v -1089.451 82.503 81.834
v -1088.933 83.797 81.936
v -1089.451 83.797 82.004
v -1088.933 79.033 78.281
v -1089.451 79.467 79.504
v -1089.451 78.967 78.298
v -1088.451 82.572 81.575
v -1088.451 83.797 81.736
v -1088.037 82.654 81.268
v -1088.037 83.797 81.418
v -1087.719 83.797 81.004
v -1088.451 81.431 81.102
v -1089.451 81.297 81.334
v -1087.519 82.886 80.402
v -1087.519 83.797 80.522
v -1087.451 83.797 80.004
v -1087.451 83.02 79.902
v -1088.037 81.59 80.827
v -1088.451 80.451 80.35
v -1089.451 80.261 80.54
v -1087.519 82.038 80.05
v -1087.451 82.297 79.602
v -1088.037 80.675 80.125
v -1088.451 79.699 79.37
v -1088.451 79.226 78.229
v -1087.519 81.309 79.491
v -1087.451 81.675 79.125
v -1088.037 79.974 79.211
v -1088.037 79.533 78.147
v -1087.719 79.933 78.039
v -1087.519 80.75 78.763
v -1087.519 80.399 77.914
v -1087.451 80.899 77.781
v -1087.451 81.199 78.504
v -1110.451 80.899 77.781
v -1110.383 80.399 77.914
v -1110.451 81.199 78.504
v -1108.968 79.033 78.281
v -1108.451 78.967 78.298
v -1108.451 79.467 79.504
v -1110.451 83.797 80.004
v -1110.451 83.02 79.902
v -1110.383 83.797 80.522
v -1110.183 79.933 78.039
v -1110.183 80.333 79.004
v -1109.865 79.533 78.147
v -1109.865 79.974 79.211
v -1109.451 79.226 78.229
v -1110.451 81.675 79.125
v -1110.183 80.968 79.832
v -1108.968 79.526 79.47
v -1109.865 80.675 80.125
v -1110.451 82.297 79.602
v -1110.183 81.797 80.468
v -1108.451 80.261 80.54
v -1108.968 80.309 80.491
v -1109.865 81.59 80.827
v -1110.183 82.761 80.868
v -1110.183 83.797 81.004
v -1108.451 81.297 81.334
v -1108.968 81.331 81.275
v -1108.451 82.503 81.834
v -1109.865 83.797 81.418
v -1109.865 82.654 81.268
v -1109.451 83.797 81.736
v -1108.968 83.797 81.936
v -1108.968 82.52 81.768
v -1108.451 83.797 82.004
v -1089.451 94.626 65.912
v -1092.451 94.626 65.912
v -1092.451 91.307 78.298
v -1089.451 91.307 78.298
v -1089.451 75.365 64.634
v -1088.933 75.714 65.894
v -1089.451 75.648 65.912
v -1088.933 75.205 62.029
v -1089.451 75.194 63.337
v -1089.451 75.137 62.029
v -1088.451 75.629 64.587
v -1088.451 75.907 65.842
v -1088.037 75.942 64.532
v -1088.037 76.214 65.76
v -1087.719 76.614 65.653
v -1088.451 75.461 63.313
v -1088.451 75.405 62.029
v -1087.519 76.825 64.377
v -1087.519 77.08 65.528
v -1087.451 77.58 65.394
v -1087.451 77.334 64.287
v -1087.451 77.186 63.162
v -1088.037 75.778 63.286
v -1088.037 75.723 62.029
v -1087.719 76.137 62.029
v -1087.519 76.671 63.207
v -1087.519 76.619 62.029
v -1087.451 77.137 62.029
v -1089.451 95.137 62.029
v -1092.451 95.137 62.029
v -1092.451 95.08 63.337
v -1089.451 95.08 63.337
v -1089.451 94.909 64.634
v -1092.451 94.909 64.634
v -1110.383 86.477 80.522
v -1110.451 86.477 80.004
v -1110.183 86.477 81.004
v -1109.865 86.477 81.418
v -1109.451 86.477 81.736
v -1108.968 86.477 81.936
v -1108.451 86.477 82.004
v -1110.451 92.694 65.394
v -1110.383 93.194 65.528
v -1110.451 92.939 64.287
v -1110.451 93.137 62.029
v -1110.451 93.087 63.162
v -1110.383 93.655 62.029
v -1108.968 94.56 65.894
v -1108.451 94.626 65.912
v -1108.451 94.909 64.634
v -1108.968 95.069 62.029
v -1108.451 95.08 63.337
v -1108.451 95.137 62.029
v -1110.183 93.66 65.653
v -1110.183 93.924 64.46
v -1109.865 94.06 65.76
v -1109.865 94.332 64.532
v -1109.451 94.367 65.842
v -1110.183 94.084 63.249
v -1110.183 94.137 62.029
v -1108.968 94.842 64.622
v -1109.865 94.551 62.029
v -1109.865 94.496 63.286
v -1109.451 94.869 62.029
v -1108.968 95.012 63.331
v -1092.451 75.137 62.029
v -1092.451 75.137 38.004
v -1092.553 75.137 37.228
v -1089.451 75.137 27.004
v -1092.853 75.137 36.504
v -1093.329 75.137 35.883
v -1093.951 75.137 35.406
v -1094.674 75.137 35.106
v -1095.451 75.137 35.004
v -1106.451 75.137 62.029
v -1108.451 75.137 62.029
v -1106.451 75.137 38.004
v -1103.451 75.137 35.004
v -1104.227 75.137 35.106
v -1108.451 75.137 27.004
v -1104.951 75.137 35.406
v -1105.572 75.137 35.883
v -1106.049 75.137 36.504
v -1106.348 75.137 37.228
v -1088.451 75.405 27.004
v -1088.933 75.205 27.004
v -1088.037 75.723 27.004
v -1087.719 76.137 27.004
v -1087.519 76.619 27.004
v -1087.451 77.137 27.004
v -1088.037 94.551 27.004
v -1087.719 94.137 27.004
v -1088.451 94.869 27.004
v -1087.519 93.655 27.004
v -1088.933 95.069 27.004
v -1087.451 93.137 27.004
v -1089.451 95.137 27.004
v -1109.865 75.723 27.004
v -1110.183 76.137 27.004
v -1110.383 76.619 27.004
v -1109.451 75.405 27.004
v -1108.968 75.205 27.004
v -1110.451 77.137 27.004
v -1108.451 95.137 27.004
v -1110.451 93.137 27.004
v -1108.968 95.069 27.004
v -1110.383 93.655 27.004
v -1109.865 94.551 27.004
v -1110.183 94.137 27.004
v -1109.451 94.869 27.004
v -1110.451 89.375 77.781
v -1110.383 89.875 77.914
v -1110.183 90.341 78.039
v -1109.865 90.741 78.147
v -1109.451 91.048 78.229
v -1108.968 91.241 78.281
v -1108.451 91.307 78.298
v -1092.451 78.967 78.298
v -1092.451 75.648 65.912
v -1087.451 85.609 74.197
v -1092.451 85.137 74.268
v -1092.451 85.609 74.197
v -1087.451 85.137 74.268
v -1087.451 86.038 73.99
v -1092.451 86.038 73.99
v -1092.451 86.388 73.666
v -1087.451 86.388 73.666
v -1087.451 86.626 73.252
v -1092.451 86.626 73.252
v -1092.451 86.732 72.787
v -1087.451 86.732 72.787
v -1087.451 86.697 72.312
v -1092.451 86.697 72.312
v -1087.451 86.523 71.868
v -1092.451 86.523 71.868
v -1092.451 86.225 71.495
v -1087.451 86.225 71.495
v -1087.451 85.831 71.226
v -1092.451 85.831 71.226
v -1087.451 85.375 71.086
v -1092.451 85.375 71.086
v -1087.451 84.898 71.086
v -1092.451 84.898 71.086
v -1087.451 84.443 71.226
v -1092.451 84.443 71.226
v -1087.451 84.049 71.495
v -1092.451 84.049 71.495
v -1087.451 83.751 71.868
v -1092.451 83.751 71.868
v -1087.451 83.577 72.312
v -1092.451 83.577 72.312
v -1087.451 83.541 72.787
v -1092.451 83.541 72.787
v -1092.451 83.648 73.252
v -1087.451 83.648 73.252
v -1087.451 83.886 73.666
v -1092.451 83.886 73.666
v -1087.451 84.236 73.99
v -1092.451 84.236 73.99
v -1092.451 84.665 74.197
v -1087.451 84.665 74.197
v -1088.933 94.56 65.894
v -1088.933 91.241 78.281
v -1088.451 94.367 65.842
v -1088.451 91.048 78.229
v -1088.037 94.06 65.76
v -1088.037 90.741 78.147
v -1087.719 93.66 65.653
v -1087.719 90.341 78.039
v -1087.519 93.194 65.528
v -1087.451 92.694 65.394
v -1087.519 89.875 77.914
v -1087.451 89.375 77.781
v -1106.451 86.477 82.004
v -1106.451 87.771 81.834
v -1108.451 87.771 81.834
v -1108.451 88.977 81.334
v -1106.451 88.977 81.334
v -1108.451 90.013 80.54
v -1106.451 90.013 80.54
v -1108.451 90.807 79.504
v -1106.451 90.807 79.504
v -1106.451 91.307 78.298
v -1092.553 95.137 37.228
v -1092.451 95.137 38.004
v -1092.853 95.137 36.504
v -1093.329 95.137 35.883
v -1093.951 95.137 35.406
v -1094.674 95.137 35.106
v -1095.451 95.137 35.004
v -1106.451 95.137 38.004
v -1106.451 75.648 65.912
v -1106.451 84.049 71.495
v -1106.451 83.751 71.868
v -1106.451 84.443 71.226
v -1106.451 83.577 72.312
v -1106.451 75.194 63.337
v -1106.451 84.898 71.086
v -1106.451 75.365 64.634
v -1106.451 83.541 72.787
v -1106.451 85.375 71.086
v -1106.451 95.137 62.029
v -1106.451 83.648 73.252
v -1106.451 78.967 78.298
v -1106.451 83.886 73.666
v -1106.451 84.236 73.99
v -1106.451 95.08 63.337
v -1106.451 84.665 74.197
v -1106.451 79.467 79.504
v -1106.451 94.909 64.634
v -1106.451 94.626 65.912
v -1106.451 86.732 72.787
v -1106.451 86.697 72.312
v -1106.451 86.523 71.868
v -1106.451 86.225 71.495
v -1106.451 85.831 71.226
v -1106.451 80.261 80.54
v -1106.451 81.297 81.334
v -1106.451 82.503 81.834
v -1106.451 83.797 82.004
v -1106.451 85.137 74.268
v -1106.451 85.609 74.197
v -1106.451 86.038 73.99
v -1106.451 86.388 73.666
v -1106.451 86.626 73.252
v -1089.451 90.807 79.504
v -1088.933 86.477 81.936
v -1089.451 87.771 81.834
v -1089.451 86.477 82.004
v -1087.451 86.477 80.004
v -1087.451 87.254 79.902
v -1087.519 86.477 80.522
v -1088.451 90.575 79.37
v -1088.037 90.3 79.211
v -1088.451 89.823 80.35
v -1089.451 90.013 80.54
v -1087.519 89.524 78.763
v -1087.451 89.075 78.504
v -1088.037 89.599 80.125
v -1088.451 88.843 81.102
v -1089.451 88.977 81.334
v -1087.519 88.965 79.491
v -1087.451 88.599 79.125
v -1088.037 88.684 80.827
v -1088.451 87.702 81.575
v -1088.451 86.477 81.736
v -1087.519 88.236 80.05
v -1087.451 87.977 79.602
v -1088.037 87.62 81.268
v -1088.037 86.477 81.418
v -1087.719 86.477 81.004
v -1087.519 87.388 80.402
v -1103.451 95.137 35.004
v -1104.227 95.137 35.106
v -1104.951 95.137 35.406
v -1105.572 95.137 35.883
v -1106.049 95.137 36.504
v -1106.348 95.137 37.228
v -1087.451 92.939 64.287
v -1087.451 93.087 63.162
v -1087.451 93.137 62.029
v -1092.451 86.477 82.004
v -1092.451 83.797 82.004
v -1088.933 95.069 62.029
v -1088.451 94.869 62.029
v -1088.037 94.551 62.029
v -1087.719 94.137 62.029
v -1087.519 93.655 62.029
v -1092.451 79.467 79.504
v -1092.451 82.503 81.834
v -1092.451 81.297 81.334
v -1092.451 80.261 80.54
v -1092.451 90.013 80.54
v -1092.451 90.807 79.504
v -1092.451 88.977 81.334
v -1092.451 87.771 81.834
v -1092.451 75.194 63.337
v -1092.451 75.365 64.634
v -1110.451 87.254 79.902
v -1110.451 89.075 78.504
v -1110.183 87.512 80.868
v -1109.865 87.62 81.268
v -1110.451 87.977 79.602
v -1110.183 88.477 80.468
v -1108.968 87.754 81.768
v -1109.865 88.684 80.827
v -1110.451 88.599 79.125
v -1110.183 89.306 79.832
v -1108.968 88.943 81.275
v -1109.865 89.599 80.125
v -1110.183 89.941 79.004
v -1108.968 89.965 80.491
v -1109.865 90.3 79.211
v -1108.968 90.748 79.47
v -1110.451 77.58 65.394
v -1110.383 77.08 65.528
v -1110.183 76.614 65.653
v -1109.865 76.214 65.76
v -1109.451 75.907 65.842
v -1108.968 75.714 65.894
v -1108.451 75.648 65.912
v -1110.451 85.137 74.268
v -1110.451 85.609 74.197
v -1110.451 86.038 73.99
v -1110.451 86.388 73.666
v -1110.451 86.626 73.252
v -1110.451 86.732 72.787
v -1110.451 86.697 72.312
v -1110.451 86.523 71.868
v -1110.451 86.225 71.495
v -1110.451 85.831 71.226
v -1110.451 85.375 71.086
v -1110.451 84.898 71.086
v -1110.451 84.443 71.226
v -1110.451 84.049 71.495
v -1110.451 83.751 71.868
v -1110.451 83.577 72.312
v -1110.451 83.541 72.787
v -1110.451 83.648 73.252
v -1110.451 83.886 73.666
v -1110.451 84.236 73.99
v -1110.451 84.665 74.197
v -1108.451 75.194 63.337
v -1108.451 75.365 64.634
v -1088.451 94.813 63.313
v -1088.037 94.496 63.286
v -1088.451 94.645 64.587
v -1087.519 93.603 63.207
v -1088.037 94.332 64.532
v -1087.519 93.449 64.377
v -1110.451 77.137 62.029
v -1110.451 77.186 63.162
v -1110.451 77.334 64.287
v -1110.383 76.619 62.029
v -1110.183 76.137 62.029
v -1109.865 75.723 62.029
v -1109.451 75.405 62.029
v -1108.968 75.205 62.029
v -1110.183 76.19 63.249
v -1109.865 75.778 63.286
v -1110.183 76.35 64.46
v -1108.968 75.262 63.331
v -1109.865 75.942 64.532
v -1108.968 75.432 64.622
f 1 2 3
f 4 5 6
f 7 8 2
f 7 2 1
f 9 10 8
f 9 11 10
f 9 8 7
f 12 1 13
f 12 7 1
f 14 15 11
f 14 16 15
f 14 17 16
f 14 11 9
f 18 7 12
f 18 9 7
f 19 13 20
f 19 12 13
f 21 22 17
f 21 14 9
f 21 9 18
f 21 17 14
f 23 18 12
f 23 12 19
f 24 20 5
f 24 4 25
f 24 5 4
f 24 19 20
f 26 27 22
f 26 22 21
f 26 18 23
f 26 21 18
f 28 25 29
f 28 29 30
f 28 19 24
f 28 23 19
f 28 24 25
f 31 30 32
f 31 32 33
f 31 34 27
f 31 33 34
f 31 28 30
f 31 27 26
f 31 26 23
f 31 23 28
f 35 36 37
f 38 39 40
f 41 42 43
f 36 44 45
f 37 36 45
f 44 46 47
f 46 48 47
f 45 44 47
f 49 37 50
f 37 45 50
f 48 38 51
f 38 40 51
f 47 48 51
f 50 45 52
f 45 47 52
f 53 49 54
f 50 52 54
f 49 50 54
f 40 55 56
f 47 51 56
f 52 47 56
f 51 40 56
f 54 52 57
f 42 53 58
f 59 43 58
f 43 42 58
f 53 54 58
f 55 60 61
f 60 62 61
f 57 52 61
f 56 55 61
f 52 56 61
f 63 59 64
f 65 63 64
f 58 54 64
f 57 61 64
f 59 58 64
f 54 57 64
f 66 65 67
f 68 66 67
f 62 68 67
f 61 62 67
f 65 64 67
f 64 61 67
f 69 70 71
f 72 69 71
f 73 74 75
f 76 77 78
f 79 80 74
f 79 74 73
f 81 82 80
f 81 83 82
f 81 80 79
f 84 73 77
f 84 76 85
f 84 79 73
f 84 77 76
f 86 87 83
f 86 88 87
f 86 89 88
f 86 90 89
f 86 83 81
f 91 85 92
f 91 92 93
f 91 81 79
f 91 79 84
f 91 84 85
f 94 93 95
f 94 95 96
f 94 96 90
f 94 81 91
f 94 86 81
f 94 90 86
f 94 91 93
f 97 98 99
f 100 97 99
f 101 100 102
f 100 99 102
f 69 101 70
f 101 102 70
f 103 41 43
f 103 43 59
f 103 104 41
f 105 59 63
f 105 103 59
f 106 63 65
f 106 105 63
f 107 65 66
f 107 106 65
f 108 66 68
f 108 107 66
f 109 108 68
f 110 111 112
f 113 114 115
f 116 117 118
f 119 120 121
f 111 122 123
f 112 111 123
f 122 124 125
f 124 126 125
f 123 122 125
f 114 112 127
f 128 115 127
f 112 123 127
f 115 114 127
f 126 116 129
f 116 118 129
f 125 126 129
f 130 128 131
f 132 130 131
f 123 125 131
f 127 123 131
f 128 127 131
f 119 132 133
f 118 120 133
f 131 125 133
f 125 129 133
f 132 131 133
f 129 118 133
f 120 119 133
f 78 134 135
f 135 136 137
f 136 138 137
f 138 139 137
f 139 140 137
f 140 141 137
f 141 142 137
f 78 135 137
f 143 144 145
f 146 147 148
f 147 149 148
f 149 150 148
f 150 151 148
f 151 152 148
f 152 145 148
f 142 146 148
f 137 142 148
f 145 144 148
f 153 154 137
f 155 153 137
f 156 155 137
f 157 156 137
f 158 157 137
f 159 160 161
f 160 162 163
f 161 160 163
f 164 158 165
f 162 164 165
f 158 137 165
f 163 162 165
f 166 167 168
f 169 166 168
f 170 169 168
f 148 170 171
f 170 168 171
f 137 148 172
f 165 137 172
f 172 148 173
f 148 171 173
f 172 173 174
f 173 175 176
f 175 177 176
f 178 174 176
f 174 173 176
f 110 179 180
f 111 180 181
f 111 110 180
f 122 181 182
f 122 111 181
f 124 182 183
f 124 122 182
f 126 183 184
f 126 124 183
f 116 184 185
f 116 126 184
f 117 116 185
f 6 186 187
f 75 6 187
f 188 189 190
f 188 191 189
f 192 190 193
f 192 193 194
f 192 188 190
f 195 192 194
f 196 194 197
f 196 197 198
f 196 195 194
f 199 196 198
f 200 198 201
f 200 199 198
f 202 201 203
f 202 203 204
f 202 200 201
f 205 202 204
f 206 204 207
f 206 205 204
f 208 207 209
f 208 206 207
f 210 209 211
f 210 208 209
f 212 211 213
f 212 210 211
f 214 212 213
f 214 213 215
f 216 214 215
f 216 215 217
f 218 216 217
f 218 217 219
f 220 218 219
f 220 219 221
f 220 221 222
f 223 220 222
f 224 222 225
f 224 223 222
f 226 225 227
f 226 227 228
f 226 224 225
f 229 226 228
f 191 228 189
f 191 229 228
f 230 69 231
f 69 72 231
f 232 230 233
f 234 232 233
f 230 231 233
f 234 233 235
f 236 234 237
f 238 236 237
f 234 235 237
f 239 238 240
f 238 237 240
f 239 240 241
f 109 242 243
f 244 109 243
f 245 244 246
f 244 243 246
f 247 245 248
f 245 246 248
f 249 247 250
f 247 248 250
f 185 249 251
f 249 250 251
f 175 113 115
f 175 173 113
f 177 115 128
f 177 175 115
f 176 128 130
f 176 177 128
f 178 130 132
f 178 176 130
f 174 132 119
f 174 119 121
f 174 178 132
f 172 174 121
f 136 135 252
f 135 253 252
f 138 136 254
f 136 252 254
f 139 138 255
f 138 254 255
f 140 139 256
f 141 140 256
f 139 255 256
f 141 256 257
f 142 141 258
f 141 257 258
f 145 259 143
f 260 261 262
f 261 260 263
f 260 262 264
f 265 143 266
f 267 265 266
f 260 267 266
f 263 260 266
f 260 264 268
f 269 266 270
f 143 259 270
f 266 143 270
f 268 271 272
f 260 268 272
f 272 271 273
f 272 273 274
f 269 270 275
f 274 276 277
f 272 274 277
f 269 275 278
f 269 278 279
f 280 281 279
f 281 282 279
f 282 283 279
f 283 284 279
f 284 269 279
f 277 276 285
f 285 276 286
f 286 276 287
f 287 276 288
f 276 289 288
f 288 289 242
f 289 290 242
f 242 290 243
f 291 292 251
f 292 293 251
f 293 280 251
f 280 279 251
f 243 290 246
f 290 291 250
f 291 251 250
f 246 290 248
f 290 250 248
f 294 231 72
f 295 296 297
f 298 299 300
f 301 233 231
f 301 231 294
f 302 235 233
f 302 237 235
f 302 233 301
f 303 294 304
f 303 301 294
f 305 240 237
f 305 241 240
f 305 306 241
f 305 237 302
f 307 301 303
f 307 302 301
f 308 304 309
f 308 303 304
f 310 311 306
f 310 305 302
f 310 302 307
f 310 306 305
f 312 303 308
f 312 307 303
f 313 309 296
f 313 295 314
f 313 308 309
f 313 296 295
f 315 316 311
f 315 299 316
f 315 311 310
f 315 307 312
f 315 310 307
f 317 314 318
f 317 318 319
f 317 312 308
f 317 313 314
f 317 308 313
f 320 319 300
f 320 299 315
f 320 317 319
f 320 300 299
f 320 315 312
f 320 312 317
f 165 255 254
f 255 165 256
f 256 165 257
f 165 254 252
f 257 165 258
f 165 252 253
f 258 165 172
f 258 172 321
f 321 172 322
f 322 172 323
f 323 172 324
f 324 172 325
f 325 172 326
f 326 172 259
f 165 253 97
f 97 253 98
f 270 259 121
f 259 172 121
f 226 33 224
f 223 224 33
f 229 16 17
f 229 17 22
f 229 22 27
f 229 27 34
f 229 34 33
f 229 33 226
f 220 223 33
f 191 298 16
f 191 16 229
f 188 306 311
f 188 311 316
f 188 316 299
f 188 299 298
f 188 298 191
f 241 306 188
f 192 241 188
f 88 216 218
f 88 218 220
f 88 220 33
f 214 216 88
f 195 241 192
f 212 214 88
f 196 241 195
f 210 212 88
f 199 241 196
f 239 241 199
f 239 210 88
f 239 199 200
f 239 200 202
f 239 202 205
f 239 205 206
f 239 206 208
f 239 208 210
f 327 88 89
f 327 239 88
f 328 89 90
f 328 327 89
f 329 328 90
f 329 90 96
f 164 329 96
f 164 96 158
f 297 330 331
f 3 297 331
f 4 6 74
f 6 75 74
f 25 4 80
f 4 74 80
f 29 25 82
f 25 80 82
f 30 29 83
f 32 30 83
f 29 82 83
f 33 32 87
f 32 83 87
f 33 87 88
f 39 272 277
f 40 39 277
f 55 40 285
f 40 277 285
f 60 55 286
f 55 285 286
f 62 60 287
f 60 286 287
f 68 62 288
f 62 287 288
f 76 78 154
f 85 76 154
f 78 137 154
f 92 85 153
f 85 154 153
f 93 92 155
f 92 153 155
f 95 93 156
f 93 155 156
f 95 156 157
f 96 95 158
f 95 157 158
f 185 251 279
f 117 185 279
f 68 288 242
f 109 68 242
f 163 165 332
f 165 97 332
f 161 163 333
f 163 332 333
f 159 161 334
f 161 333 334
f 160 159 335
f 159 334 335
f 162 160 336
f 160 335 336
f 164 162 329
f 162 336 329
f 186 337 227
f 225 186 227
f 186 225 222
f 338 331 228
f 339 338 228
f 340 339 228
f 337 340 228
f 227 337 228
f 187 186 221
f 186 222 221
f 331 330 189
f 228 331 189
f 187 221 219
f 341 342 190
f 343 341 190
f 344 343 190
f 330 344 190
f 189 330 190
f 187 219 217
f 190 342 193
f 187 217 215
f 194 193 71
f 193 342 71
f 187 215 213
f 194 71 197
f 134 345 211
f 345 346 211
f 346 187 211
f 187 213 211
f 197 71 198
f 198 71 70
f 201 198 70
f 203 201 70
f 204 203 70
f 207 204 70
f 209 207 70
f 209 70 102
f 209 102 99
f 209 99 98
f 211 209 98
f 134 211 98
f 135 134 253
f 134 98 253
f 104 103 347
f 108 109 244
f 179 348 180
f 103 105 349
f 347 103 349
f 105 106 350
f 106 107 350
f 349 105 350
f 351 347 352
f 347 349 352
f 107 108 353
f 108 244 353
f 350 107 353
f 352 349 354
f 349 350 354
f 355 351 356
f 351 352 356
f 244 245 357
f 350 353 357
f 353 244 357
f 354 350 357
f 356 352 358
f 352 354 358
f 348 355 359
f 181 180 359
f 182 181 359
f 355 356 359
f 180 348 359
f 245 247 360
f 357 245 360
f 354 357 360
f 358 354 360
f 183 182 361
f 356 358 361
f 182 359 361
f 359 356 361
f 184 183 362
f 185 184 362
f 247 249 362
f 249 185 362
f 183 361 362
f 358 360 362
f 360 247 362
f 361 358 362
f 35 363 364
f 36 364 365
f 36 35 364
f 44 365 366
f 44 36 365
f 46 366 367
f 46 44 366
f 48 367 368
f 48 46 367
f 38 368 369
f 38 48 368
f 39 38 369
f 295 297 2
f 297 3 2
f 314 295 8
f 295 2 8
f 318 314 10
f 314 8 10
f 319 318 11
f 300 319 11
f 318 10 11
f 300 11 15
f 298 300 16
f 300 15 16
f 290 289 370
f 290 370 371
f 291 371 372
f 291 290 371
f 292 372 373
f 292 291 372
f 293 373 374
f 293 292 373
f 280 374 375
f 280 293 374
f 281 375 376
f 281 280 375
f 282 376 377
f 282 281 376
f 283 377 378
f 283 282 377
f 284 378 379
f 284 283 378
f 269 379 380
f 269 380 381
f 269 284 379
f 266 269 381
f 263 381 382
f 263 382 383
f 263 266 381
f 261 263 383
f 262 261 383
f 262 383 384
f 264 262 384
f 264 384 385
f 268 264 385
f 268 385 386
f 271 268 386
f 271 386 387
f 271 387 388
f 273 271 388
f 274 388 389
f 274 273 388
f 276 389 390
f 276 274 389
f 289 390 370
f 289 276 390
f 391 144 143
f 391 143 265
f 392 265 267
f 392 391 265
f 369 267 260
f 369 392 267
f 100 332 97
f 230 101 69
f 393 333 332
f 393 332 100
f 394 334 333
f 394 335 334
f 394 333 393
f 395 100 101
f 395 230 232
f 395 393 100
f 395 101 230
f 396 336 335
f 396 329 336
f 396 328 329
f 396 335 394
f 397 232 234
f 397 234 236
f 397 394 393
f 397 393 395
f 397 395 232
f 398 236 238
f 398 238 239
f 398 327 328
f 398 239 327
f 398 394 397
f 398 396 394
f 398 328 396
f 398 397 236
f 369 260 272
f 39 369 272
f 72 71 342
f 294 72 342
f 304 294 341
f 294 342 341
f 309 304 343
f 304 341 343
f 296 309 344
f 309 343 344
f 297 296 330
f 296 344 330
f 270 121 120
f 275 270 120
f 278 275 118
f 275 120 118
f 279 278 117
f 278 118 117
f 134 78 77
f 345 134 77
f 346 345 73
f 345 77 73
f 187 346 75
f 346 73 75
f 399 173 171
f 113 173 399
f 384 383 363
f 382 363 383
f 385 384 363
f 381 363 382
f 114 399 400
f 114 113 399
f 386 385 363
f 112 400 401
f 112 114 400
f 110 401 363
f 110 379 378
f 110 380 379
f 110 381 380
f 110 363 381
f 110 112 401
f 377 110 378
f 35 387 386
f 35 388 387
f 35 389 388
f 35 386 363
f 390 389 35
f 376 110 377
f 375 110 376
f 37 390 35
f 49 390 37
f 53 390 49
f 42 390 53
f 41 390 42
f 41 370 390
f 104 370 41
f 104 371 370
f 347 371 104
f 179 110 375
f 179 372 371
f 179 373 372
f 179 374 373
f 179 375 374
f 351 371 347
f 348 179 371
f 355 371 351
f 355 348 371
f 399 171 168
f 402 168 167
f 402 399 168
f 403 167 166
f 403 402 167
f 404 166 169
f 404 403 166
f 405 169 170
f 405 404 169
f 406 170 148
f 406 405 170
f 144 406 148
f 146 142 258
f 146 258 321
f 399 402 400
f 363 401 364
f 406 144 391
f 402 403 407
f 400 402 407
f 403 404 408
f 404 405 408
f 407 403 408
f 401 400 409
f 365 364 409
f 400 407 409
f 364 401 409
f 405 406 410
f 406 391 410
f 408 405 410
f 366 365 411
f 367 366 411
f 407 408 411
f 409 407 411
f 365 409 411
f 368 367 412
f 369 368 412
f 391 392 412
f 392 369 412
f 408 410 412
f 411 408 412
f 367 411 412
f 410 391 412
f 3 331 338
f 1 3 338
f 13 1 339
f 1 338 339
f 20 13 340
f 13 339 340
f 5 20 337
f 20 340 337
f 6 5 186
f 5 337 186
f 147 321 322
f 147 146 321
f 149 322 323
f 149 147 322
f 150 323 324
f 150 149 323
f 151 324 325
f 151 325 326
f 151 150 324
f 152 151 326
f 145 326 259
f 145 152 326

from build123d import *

# Parameters (mm, degrees)
SKETCH1_R           = 1.6
BOSS_EXTRUDE1_DEPTH = 2.5
SKETCH2_R           = 1.6
BOSS_EXTRUDE2_DEPTH = 4
SKETCH3_W           = 23
SKETCH3_H           = 20
BOSS_EXTRUDE3_DEPTH = 8
FILLET1_R           = 3
FILLET2_R           = 15
FILLET3_R           = 2


with BuildPart() as part:
    # Sketch1 → Boss-Extrude1 (new, symmetric)
    with BuildSketch(Plane.ZY.offset(1089.950719415)):
        with BuildLine():
            Line((82.004058992, 86.47718844), (82.004058992, 83.796629248))
            ThreePointArc((82.004058992, 83.796629248), (80.970825694, 80.752822103), (78.298154218, 78.967000116))
            Line((78.298154218, 78.967000116), (64.004058992, 75.136908844))
            Line((64.004058992, 75.136908844), (27.004058992, 75.136908844))
            Line((27.004058992, 75.136908844), (27.004058992, 95.136908844))
            Line((27.004058992, 95.136908844), (64.004058992, 95.136908844))
            Line((64.004058992, 95.136908844), (78.298154218, 91.306817572))
            ThreePointArc((78.298154218, 91.306817572), (80.970825694, 89.520995585), (82.004058992, 86.47718844))
        make_face()
        with Locations((72.667931354, 85.136908844)):
            Circle(SKETCH1_R, mode=Mode.SUBTRACT)
    extrude(amount=BOSS_EXTRUDE1_DEPTH, both=True)



with BuildPart() as body_2:
    # Sketch2 → Boss-Extrude2 (new body)
    with BuildSketch(Plane.ZY.offset(1106.450719415)):
        with BuildLine():
            Line((27.004058992, 95.136908844), (27.004058992, 75.136908844))
            Line((27.004058992, 75.136908844), (64.004058992, 75.136908844))
            Line((64.004058992, 75.136908844), (78.298154218, 78.967000116))
            ThreePointArc((78.298154218, 78.967000116), (80.970825694, 80.752822103), (82.004058992, 83.796629248))
            Line((82.004058992, 83.796629248), (82.004058992, 86.47718844))
            ThreePointArc((82.004058992, 86.47718844), (80.970825694, 89.520995585), (78.298154218, 91.306817572))
            Line((78.298154218, 91.306817572), (64.004058992, 95.136908844))
            Line((64.004058992, 95.136908844), (27.004058992, 95.136908844))
        make_face()
        with Locations((72.667931354, 85.136908844)):
            Circle(SKETCH2_R, mode=Mode.SUBTRACT)
    extrude(amount=BOSS_EXTRUDE2_DEPTH)


with BuildPart() as part_1:
    add(part.part)

    add(body_2.part)  # Boss-Extrude3 merges body 2
    # Sketch3 → Boss-Extrude3 (add)
    with BuildSketch(Plane(origin=(0, 0, 27.004058992), x_dir=(-1, 0, 0), z_dir=(0, 0, -1))):
        with Locations((1098.950719415, 85.136908844)):
            Rectangle(SKETCH3_W, SKETCH3_H)
    extrude(amount=-BOSS_EXTRUDE3_DEPTH)

    # Fillet1
    fillet1_edges = [part_1.edges().sort_by_distance(p)[0] for p in [
        (-1092.450719415, 85.136908844, 35.004058992),
        (-1106.450719415, 85.136908844, 35.004058992),
    ]]
    fillet(fillet1_edges, radius=FILLET1_R)

    # Fillet2
    fillet2_edges = [part_1.edges().sort_by_distance(p)[0] for p in [
        (-1089.950719415, 95.136908844, 64.004058992),
        (-1089.950719415, 75.136908844, 64.004058992),
        (-1108.450719415, 95.136908844, 64.004058992),
        (-1108.450719415, 75.136908844, 64.004058992),
    ]]
    fillet(fillet2_edges, radius=FILLET2_R)

    # Fillet3
    fillet3_edges = [part_1.edges().sort_by_distance(p)[0] for p in [
        (-1087.450719415, 80.752822103, 80.970825694),
        (-1087.450719415, 75.136908844, 44.51666526),
        (-1110.450719415, 80.752822103, 80.970825694),
        (-1110.450719415, 85.136908844, 82.004058992),
        (-1110.450719415, 89.520995585, 80.970825694),
        (-1110.450719415, 92.966306905, 72.104855711),
        (-1110.450719415, 95.136908844, 44.51666526),
        (-1087.450719415, 95.136908844, 44.51666526),
        (-1087.450719415, 92.966306905, 72.104855711),
        (-1110.450719415, 75.136908844, 44.51666526),
        (-1087.450719415, 89.520995585, 80.970825694),
        (-1110.450719415, 77.307510783, 72.104855711),
        (-1110.450719415, 75.265235923, 63.987164412),
        (-1110.450719415, 95.008581765, 63.987164412),
        (-1087.450719415, 77.307510783, 72.104855711),
        (-1087.450719415, 75.265235923, 63.987164412),
        (-1087.450719415, 95.008581765, 63.987164412),
        (-1087.450719415, 85.136908844, 82.004058992),
    ]]
    fillet(fillet3_edges, radius=FILLET3_R)


solid = part_1.part
